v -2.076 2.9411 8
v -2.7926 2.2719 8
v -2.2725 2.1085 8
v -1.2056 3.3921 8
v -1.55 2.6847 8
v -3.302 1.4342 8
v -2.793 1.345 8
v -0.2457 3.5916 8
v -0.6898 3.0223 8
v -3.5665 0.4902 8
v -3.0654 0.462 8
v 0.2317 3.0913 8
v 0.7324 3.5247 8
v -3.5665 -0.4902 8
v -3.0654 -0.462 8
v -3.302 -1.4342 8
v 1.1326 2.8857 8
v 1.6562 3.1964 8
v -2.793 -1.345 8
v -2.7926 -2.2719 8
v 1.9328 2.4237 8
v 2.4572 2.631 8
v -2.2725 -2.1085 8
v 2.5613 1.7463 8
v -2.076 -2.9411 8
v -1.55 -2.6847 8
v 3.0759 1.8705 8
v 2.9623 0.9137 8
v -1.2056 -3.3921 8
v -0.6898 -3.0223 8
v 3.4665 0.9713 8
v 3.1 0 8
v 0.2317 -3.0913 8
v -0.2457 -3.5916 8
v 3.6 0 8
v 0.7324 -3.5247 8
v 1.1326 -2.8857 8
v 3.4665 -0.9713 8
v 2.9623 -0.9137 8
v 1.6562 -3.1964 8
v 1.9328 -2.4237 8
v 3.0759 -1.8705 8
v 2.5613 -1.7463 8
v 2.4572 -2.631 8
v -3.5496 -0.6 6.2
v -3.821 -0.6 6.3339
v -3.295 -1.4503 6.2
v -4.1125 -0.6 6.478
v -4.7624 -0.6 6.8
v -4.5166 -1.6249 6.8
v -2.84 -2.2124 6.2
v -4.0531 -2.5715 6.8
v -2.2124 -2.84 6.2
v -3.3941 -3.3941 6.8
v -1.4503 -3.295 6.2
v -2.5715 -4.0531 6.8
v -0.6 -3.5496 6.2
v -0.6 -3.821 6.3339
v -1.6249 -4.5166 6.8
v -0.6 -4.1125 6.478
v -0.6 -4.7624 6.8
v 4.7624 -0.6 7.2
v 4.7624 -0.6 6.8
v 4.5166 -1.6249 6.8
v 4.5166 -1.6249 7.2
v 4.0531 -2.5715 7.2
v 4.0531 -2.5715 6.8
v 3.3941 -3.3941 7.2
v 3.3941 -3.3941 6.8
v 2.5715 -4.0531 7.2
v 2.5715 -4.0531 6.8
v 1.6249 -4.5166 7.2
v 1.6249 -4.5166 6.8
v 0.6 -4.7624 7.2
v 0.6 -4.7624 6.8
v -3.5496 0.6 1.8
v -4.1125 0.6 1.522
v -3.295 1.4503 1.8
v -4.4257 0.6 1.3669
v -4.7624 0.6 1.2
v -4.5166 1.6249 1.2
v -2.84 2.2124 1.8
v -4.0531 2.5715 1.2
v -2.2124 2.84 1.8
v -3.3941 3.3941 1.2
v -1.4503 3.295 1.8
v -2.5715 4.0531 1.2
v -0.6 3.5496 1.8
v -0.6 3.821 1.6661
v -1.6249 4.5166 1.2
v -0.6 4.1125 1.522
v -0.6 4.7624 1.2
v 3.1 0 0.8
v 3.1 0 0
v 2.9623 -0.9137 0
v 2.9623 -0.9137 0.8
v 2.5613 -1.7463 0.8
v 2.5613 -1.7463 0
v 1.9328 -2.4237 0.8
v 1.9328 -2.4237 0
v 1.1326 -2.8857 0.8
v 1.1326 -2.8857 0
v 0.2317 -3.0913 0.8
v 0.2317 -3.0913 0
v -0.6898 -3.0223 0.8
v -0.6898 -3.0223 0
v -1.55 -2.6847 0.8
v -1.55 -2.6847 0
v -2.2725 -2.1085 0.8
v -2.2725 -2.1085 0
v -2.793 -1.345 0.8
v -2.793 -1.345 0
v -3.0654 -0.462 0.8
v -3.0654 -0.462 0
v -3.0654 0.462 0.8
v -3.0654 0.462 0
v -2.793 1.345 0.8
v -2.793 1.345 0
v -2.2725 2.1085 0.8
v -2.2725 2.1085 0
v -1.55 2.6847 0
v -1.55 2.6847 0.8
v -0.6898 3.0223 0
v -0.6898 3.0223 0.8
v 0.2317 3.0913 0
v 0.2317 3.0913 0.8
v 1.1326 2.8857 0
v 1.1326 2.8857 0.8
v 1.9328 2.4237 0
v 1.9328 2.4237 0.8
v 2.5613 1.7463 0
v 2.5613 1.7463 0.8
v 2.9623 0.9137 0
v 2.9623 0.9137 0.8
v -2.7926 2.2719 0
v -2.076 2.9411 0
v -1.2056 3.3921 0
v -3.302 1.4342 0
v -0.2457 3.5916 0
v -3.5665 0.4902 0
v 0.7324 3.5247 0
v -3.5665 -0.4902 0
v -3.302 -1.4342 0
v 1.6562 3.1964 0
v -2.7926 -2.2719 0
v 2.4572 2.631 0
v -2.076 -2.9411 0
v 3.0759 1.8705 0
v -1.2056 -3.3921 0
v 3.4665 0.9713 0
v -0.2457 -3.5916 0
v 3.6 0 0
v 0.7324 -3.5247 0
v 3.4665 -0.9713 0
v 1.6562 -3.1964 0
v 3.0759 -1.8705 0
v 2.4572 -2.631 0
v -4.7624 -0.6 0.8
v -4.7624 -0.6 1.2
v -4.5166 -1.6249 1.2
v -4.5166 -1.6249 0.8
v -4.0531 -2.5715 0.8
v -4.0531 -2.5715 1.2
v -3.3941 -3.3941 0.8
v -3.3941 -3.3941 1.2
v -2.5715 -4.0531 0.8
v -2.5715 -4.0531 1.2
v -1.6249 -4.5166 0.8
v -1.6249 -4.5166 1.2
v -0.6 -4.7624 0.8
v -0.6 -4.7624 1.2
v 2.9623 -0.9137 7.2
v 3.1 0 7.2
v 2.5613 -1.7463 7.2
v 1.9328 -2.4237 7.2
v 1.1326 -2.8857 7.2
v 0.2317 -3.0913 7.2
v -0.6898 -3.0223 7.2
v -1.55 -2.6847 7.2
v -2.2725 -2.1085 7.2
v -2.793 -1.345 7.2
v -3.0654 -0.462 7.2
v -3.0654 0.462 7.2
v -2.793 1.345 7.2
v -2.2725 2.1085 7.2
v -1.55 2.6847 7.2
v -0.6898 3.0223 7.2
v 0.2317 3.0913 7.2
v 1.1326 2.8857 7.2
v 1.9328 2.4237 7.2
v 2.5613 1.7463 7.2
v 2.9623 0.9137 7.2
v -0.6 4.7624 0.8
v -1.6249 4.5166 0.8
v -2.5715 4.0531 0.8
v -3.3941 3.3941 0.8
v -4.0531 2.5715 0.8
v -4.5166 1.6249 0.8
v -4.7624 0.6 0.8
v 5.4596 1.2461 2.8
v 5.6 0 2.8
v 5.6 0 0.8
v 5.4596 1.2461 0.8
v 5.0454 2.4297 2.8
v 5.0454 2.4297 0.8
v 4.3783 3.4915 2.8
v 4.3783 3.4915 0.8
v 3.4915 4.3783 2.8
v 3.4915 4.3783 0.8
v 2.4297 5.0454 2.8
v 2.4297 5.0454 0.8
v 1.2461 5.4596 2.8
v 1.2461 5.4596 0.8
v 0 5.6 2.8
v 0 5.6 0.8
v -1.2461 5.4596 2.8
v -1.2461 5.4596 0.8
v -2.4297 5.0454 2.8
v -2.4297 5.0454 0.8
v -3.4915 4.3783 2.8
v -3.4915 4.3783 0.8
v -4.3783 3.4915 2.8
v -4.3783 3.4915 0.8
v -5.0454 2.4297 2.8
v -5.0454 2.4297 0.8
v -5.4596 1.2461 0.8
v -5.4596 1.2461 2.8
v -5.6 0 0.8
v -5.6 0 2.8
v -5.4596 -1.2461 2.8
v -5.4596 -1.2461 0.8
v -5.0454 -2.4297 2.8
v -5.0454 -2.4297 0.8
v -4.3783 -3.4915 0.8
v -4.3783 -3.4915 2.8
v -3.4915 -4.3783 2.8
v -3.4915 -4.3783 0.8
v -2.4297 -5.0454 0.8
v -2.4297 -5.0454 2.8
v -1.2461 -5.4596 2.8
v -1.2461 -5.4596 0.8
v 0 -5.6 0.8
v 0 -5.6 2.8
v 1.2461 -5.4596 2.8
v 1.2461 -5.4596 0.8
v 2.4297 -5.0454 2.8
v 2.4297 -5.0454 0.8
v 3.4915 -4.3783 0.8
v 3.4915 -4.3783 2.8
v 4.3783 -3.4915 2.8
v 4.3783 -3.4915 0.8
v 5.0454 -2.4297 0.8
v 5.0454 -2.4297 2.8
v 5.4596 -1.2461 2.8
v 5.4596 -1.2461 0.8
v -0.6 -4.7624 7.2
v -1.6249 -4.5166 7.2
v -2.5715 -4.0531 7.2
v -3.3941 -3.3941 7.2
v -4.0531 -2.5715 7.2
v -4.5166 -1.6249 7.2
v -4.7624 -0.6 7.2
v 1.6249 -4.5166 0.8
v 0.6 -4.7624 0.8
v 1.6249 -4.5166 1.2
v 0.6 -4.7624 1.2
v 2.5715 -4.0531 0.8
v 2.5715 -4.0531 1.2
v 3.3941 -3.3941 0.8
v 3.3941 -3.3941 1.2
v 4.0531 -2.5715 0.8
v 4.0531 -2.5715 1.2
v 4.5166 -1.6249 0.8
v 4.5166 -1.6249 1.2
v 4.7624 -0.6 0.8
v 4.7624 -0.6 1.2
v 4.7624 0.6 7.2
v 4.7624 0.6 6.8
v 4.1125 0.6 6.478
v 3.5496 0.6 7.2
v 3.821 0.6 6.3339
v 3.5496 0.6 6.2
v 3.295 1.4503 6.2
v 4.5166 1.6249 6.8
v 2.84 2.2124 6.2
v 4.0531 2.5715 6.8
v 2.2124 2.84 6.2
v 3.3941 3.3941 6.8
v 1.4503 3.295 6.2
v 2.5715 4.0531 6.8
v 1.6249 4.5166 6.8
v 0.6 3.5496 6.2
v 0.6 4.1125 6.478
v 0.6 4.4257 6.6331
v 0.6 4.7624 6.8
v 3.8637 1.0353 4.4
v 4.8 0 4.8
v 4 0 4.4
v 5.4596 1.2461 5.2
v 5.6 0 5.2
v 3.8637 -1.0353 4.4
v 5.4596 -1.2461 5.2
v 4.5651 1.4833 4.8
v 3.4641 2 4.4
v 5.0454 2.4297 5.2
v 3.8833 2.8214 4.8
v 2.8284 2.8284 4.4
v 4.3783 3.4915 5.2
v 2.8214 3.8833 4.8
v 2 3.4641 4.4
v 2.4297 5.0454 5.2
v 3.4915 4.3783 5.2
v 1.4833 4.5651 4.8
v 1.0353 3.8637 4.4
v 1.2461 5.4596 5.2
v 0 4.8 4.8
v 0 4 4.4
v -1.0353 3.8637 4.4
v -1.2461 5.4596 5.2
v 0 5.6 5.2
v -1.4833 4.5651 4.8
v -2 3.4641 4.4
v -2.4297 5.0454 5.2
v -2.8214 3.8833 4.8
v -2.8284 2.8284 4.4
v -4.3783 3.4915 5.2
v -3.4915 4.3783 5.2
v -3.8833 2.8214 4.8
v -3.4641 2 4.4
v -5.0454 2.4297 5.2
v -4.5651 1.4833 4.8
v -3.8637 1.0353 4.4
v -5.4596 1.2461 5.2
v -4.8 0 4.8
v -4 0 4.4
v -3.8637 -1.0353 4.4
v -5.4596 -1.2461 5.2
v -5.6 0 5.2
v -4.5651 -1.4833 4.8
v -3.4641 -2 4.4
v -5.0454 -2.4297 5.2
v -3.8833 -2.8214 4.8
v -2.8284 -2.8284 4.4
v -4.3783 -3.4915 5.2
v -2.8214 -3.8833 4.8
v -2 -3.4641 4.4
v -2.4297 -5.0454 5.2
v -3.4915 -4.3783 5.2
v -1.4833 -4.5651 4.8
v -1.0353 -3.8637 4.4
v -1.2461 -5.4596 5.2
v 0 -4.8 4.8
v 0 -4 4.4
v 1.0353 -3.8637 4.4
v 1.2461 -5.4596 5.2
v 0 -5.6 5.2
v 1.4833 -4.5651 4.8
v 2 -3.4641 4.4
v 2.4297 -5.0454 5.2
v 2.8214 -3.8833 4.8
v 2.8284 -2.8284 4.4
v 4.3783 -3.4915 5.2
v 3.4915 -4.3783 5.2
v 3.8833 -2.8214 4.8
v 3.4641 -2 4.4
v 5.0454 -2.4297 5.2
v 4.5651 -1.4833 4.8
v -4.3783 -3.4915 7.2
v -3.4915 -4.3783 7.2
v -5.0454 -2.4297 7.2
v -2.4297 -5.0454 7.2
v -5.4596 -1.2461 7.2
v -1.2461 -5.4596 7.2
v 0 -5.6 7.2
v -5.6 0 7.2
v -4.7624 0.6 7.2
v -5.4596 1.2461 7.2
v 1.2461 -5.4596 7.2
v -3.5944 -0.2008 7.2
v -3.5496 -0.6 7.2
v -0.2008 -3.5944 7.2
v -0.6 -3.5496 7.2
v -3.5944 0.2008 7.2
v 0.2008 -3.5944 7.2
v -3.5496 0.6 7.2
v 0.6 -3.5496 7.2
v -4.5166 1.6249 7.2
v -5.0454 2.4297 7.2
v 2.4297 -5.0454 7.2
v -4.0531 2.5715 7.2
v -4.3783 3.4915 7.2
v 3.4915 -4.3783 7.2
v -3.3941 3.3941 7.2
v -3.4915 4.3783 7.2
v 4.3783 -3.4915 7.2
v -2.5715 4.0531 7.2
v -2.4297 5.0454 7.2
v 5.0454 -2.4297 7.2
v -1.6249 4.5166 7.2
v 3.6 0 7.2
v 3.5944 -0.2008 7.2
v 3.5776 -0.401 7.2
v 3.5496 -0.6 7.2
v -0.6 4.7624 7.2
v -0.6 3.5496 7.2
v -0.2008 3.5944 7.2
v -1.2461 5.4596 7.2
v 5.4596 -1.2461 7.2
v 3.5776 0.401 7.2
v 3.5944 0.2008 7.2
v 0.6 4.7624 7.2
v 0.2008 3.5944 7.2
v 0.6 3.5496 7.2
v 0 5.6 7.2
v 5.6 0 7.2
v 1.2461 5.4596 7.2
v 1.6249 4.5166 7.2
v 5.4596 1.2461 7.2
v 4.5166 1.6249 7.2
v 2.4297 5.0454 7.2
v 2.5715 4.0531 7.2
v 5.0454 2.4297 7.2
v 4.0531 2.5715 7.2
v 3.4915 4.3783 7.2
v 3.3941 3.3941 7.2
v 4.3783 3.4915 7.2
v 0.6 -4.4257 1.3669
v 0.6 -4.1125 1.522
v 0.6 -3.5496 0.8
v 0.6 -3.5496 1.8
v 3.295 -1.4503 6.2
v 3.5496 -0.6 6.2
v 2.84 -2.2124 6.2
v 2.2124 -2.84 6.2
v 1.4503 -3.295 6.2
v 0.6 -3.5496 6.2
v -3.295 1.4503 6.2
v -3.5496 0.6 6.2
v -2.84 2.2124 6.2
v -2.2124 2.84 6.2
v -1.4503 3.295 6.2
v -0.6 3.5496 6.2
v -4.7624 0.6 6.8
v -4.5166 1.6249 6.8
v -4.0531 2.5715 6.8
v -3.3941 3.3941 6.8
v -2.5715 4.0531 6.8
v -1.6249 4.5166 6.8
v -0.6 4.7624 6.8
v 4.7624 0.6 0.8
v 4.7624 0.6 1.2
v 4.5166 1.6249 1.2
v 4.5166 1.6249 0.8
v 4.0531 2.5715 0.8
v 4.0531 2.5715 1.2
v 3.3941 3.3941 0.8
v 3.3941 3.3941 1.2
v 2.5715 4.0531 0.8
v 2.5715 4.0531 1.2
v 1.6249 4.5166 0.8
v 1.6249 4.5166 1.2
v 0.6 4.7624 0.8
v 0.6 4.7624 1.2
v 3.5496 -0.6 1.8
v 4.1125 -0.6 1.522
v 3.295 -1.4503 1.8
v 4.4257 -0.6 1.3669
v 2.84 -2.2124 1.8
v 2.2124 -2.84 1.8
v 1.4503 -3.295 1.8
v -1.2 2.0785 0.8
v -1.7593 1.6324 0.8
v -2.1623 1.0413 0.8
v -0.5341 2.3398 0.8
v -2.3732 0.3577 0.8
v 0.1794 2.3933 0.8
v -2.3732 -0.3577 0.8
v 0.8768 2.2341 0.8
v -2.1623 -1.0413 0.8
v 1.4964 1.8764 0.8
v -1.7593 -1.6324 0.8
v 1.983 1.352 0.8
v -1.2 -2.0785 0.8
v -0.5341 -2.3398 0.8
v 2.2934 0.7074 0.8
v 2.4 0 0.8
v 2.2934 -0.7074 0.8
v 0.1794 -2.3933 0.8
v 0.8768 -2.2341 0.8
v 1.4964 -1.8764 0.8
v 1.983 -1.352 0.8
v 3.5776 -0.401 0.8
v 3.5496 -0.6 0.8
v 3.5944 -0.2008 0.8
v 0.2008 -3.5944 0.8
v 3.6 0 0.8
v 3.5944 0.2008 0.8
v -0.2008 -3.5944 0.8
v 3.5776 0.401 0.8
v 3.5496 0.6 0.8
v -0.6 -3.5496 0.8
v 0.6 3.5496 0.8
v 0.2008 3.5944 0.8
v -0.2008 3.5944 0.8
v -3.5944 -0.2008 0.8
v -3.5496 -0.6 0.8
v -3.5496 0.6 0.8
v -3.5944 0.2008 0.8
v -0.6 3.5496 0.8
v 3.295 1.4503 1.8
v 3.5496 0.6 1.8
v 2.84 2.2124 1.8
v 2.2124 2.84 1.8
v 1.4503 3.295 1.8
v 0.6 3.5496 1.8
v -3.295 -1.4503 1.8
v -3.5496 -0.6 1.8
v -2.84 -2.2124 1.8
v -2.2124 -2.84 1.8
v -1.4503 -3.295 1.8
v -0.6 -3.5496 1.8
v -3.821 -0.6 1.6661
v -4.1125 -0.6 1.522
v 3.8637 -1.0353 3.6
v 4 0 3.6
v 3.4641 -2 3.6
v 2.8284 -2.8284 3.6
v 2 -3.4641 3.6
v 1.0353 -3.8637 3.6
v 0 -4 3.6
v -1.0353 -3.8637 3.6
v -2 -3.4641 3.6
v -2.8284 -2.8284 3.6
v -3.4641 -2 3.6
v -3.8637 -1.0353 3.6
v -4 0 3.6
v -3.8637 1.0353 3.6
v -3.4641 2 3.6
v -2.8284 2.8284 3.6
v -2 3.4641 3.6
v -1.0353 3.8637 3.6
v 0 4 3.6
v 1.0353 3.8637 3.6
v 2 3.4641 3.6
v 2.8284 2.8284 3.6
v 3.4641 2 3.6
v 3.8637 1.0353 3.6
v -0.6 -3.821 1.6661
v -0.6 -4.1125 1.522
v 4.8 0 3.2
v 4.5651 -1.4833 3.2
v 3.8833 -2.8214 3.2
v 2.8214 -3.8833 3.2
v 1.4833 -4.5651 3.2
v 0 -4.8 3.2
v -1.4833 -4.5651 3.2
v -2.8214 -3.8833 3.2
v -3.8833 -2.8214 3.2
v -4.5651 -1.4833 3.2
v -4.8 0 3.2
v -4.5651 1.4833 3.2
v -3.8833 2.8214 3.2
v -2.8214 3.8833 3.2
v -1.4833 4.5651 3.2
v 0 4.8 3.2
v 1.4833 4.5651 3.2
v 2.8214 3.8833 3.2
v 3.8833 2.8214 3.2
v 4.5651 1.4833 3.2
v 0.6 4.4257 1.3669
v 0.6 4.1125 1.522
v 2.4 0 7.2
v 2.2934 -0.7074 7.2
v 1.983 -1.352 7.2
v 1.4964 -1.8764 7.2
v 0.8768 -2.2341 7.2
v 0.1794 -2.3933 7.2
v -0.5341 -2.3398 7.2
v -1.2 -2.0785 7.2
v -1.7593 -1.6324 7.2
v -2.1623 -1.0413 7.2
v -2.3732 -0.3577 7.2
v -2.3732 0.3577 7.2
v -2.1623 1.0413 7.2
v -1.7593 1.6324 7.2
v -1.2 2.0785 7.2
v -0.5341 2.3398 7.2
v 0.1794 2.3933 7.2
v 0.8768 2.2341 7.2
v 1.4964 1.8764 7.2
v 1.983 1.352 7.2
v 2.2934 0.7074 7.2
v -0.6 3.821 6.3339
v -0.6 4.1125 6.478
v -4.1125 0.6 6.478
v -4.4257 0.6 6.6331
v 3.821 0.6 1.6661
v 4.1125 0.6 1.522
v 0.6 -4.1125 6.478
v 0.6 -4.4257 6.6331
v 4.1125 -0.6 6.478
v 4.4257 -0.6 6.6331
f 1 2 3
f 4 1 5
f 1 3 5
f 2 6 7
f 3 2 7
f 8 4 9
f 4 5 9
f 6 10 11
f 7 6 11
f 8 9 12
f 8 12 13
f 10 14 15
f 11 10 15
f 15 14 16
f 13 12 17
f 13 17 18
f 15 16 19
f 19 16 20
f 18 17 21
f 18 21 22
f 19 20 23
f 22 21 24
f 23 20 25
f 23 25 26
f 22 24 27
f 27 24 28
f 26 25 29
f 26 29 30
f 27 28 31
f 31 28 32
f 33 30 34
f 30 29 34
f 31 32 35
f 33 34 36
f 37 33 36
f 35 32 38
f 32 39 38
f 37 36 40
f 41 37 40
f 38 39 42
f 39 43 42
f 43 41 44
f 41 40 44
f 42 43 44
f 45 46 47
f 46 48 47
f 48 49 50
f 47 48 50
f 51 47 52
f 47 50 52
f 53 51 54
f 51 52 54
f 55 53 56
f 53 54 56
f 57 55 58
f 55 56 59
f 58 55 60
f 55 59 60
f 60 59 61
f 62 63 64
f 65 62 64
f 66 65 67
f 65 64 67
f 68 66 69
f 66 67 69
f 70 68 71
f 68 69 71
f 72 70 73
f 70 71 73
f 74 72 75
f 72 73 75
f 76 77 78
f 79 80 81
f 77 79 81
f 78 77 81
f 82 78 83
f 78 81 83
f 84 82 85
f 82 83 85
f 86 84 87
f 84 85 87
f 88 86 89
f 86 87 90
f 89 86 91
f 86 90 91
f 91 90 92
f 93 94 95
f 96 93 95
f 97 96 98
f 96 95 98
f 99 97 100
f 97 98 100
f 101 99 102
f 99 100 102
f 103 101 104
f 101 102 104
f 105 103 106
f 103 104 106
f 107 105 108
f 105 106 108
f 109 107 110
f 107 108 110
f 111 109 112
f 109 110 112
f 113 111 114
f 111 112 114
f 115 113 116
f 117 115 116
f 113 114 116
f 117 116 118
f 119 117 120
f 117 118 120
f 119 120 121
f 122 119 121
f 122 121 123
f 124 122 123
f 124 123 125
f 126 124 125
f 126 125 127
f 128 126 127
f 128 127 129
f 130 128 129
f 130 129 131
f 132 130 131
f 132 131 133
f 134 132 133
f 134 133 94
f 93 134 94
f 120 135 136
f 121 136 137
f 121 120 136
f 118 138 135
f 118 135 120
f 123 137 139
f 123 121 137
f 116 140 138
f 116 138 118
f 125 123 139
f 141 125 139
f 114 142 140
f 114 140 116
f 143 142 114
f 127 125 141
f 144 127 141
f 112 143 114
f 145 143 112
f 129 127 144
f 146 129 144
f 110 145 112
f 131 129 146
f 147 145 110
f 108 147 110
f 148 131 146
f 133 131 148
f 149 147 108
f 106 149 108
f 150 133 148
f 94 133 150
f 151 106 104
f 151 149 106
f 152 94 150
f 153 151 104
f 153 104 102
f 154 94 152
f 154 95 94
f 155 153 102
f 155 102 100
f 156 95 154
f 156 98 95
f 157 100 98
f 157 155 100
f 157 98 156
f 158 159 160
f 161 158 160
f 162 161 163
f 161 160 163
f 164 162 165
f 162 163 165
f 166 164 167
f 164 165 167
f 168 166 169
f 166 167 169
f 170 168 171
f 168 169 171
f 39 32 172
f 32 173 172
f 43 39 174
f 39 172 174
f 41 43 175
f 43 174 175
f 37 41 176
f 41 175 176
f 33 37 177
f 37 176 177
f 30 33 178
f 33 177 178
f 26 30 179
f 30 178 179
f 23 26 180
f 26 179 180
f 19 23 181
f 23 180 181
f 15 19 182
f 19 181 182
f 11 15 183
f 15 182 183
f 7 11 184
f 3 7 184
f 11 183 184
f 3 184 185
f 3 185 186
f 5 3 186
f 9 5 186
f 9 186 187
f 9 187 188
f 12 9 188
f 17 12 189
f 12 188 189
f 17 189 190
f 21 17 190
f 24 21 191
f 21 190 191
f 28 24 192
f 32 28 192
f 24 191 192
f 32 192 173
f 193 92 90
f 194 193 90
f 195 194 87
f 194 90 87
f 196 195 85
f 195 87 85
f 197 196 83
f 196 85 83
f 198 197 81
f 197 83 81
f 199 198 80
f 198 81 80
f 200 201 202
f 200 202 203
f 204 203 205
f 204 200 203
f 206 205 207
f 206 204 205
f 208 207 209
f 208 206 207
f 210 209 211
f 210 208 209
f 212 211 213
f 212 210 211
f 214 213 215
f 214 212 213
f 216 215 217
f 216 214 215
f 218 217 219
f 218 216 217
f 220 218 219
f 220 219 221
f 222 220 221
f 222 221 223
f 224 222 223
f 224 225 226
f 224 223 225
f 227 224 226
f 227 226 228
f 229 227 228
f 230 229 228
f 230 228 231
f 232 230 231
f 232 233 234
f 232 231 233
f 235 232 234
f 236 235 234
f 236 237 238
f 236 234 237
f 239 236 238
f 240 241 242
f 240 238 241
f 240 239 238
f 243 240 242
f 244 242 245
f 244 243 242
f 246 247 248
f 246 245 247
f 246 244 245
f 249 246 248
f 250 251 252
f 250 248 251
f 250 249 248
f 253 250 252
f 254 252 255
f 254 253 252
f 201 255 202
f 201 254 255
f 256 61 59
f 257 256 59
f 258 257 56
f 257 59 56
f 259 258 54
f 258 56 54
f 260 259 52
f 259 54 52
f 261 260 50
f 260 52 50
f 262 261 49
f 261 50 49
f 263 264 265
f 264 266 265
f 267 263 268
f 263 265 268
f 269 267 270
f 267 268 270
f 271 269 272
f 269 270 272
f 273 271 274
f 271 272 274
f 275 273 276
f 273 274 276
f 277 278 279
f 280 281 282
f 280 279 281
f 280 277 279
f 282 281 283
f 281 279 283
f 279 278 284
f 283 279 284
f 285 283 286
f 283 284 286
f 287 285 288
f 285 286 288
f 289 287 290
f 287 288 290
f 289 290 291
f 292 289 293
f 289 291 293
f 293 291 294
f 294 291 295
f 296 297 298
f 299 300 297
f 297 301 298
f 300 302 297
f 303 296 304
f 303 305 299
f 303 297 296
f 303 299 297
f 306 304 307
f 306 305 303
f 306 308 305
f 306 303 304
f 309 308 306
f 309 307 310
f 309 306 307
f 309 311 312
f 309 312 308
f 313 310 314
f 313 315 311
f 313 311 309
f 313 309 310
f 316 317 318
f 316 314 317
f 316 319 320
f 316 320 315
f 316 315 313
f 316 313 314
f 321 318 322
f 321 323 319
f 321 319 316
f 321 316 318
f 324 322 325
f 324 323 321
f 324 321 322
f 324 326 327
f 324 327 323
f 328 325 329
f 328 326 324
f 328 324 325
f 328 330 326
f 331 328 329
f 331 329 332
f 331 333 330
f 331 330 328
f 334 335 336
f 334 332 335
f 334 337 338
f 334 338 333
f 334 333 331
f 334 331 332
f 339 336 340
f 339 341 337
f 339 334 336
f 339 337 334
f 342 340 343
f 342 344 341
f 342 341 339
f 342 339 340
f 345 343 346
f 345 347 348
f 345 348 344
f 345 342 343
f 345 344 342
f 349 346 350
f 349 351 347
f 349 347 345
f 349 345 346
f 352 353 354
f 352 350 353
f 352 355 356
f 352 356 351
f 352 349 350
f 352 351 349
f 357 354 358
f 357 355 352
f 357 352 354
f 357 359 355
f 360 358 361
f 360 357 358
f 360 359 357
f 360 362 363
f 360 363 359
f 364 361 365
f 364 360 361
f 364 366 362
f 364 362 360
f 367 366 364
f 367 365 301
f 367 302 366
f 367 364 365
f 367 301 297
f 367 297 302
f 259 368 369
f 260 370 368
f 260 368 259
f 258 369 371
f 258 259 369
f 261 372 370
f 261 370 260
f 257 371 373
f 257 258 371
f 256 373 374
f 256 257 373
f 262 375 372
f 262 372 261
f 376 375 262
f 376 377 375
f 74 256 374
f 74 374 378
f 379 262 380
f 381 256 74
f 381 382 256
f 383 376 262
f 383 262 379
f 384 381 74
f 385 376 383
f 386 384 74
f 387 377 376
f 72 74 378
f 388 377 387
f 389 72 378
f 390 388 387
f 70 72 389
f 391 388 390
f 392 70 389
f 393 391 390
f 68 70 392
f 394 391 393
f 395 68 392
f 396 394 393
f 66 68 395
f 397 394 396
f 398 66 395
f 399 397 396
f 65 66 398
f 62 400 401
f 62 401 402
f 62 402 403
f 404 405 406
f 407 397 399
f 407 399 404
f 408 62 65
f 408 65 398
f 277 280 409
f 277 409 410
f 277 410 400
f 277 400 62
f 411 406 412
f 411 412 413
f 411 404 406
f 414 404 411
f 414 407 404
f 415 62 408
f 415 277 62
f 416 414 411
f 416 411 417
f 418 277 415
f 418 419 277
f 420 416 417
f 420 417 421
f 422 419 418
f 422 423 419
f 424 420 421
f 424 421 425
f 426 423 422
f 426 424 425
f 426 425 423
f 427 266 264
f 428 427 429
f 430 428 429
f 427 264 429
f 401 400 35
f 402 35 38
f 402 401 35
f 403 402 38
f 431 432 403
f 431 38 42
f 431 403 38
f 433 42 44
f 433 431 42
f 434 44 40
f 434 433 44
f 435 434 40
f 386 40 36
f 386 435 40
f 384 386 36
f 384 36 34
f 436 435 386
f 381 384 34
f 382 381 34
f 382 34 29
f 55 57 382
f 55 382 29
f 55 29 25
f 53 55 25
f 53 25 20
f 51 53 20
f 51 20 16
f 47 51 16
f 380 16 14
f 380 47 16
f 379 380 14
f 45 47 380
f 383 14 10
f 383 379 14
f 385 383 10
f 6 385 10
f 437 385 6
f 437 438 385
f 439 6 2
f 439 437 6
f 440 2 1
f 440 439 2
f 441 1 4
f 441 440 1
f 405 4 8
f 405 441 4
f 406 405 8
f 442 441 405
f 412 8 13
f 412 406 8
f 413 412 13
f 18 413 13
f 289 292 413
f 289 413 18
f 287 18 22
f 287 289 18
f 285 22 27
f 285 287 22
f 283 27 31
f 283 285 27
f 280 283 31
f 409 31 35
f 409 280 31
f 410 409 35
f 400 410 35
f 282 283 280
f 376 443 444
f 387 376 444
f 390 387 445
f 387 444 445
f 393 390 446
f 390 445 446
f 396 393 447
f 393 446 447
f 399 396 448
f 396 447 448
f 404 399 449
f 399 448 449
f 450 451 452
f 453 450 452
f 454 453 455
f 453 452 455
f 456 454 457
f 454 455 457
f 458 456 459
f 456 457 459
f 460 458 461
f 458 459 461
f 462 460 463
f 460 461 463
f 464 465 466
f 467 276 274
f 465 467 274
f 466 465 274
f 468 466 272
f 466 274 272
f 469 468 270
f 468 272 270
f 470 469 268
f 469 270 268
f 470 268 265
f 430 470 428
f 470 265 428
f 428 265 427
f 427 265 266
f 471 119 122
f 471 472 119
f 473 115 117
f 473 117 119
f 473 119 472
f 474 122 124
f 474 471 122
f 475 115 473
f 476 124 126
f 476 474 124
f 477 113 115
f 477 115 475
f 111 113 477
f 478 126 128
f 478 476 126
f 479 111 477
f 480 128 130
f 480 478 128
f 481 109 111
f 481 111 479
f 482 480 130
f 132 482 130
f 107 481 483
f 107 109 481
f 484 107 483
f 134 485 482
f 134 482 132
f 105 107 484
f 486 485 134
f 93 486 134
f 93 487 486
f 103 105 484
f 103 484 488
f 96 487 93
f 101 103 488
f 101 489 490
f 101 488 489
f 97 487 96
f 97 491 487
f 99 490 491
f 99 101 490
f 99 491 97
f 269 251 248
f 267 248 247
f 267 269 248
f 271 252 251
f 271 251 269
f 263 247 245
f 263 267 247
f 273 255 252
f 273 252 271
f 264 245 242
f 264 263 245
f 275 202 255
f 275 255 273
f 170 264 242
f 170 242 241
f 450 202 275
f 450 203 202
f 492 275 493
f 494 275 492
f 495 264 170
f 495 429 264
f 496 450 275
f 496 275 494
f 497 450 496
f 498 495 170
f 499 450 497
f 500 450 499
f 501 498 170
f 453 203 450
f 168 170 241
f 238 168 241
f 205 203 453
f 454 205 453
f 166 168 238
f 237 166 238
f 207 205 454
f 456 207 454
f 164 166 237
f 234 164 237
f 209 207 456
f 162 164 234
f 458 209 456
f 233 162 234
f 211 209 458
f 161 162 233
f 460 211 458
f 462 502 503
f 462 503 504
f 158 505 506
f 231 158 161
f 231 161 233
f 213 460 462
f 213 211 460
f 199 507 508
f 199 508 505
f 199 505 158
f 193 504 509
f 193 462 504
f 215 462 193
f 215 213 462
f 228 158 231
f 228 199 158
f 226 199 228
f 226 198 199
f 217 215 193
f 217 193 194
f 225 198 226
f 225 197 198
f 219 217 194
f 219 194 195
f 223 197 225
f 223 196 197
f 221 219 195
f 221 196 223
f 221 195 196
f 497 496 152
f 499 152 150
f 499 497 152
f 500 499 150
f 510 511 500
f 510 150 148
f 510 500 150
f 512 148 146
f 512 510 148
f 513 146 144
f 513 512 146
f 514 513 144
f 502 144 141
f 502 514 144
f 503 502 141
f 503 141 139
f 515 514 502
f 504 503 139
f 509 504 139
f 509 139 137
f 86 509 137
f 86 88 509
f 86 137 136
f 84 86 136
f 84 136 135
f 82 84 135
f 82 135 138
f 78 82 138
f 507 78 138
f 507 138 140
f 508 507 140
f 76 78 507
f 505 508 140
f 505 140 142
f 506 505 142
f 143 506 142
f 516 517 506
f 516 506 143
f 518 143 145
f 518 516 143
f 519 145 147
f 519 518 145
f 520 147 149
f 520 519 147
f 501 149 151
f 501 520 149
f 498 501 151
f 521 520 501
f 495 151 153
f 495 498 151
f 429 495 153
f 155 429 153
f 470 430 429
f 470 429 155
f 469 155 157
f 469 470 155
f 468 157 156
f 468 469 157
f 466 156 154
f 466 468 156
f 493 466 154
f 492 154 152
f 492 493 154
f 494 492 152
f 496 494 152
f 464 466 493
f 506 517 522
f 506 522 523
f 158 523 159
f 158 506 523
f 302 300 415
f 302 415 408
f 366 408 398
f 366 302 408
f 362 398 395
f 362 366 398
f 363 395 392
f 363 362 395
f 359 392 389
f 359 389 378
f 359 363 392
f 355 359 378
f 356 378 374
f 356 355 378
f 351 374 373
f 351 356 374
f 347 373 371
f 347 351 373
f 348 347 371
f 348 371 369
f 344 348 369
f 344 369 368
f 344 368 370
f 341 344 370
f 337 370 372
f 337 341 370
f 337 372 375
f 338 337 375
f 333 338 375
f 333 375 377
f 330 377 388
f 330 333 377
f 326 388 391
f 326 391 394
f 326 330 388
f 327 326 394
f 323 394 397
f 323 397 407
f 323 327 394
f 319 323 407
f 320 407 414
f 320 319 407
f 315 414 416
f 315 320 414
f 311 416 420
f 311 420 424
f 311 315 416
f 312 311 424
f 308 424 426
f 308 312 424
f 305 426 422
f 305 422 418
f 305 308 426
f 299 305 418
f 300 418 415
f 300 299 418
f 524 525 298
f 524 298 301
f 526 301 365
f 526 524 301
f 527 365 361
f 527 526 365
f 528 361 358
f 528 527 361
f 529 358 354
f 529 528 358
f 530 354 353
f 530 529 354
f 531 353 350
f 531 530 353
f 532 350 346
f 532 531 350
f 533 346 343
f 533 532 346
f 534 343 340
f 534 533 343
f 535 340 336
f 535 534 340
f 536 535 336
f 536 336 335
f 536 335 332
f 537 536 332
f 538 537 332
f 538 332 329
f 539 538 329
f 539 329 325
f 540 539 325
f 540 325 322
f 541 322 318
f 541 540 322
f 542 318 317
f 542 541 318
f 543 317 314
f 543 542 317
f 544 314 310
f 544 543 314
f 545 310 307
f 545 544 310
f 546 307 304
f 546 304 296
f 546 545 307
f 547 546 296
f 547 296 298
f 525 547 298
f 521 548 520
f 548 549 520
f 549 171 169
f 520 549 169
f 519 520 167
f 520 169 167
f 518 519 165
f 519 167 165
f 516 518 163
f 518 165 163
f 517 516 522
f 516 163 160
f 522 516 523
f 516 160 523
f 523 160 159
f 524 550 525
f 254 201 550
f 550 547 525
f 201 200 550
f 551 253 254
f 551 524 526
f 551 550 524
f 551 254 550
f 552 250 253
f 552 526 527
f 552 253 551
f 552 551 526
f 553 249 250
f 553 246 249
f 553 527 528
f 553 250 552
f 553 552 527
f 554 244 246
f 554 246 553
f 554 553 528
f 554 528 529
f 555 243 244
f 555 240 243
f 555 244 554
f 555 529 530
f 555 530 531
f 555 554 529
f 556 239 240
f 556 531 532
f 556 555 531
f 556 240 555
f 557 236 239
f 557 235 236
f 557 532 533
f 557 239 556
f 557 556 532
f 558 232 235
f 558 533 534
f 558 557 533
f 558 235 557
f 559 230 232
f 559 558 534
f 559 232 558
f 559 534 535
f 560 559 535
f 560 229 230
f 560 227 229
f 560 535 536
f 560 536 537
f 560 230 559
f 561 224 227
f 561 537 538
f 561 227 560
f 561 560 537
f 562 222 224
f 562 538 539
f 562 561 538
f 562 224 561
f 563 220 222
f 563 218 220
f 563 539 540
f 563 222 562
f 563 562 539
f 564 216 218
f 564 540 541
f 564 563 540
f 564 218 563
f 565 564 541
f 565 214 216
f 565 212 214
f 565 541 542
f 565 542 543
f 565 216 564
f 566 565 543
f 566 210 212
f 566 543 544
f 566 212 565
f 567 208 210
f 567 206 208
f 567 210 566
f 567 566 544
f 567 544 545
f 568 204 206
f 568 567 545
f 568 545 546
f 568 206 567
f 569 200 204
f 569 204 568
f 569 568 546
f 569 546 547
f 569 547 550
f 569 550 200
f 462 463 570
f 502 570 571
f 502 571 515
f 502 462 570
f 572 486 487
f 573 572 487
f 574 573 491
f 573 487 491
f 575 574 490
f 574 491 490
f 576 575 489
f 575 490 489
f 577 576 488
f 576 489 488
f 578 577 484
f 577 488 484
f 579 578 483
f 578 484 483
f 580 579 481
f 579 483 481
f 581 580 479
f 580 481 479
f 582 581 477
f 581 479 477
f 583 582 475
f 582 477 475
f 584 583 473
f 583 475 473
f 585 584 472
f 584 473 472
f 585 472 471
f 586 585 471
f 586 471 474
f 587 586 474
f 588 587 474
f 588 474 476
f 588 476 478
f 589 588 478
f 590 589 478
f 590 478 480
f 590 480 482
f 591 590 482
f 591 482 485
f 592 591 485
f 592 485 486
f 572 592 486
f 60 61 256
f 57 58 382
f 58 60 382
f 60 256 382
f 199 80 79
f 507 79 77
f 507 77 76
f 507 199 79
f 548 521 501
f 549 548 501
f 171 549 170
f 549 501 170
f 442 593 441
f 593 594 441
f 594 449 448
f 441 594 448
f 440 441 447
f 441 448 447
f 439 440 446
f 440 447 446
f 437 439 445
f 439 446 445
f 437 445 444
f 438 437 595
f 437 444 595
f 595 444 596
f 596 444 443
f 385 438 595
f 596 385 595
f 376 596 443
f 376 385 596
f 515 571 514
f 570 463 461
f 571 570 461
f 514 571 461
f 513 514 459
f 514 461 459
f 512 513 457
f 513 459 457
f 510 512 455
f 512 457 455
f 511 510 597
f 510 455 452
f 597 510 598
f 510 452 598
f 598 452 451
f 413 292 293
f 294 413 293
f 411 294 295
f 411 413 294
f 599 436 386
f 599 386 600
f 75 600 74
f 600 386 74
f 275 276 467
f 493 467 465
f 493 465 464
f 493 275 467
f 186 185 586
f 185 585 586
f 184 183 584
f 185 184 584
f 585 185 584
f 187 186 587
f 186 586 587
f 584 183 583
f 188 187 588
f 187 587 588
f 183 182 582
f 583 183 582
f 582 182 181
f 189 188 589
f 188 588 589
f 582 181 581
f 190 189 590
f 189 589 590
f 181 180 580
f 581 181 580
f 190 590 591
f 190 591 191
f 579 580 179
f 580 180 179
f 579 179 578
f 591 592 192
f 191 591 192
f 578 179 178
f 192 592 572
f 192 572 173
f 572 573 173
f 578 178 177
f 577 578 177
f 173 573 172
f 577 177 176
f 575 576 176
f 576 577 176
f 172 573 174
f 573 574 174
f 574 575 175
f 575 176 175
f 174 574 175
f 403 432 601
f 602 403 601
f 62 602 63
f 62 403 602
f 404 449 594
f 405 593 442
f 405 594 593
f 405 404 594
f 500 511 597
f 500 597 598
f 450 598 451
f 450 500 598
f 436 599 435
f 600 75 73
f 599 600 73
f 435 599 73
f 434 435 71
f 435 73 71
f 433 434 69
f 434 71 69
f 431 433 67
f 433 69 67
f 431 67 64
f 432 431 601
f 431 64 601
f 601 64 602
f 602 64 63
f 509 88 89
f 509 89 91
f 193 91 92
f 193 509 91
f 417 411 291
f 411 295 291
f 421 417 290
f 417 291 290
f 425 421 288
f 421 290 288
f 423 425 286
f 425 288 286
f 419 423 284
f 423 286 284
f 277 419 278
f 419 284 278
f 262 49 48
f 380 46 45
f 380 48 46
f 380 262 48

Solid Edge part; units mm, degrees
sketch "Sketch1" plane through (0, 0, 0) normal (0, -1, 0) x (1, 0, 0)
  line L0 (3.1, 8) -> (3.6, 8)
  line L1 (3.6, 8) -> (3.6, 6.2)
  line L2 (4.8, 6.8) -> (3.6, 6.2)
  line L3 (4.8, 7.2) -> (4.8, 6.8)
  line L4 (4.8, 7.2) -> (5.6, 7.2)
  line L5 (5.6, 7.2) -> (5.6, 5.2)
  line L6 (4, 4.4) -> (5.6, 5.2)
  line L7 (4, 4.4) -> (4, 3.6)
  line L8 (4, 3.6) -> (5.6, 2.8)
  line L9 (5.6, 0.8) -> (5.6, 2.8)
  line L10 (5.6, 0.8) -> (4.8, 0.8)
  line L11 (4.8, 0.8) -> (4.8, 1.2)
  line L12 (3.6, 1.8) -> (4.8, 1.2)
  line L13 (3.6, 0) -> (3.6, 1.8)
  line L14 (3.6, 0) -> (3.1, 0)
  line L15 (3.1, 0.8) -> (3.1, 0)
  line L16 (2.4, 0.8) -> (3.1, 0.8)
  line L17 (2.4, 7.2) -> (2.4, 0.8)
  line L18 (2.4, 7.2) -> (3.1, 7.2)
  line L19 (3.1, 8) -> (3.1, 7.2)
  dimension "D1" = 0.8
  dimension "D2" = 0.4
revolve "RevolvedProtrusion1" add sketch "Sketch1" angle 360 about axis through (0, 0, 54) along (0, 0, -1)
sketch "Sketch2" plane through (0, 0, 7.2) normal (0, 0, 1) x (1, 0, 0)
  line L0 (4.8, 0) -> (4.8, 0.6)
  line L1 (4.8, 0.6) -> (3.5496, 0.6)
  line L2 (3.5496, 0.6) -> (3.5496, -0.6)
  line L3 (3.5496, -0.6) -> (4.8, -0.6)
  line L4 (4.8, -0.6) -> (4.8, 0)
  line L5 (-3.5496, 0.6) -> (-3.5496, -0.6)
  line L6 (-4.8, -0.6) -> (-3.5496, -0.6)
  line L7 (-4.8, 0) -> (-4.8, -0.6)
  line L8 (-4.8, 0.6) -> (-4.8, 0)
  line L9 (-3.5496, 0.6) -> (-4.8, 0.6)
  line L10 (0, 4.8) -> (-0.6, 4.8)
  line L11 (-0.6, 4.8) -> (-0.6, 3.5496)
  line L12 (-0.6, 3.5496) -> (0.6, 3.5496)
  line L13 (0.6, 3.5496) -> (0.6, 4.8)
  line L14 (0.6, 4.8) -> (0, 4.8)
  line L15 (0, -4.8) -> (-0.6, -4.8)
  line L16 (-0.6, -4.8) -> (-0.6, -3.5496)
  line L17 (-0.6, -3.5496) -> (0.6, -3.5496)
  line L18 (0.6, -3.5496) -> (0.6, -4.8)
  line L19 (0.6, -4.8) -> (0, -4.8)
extrude "Protrusion1" add sketch "Sketch2" against normal blind 1
mirror "Mirror1" about plane through (0, 0, 4) normal (0, 0, 1) of "Protrusion1"
